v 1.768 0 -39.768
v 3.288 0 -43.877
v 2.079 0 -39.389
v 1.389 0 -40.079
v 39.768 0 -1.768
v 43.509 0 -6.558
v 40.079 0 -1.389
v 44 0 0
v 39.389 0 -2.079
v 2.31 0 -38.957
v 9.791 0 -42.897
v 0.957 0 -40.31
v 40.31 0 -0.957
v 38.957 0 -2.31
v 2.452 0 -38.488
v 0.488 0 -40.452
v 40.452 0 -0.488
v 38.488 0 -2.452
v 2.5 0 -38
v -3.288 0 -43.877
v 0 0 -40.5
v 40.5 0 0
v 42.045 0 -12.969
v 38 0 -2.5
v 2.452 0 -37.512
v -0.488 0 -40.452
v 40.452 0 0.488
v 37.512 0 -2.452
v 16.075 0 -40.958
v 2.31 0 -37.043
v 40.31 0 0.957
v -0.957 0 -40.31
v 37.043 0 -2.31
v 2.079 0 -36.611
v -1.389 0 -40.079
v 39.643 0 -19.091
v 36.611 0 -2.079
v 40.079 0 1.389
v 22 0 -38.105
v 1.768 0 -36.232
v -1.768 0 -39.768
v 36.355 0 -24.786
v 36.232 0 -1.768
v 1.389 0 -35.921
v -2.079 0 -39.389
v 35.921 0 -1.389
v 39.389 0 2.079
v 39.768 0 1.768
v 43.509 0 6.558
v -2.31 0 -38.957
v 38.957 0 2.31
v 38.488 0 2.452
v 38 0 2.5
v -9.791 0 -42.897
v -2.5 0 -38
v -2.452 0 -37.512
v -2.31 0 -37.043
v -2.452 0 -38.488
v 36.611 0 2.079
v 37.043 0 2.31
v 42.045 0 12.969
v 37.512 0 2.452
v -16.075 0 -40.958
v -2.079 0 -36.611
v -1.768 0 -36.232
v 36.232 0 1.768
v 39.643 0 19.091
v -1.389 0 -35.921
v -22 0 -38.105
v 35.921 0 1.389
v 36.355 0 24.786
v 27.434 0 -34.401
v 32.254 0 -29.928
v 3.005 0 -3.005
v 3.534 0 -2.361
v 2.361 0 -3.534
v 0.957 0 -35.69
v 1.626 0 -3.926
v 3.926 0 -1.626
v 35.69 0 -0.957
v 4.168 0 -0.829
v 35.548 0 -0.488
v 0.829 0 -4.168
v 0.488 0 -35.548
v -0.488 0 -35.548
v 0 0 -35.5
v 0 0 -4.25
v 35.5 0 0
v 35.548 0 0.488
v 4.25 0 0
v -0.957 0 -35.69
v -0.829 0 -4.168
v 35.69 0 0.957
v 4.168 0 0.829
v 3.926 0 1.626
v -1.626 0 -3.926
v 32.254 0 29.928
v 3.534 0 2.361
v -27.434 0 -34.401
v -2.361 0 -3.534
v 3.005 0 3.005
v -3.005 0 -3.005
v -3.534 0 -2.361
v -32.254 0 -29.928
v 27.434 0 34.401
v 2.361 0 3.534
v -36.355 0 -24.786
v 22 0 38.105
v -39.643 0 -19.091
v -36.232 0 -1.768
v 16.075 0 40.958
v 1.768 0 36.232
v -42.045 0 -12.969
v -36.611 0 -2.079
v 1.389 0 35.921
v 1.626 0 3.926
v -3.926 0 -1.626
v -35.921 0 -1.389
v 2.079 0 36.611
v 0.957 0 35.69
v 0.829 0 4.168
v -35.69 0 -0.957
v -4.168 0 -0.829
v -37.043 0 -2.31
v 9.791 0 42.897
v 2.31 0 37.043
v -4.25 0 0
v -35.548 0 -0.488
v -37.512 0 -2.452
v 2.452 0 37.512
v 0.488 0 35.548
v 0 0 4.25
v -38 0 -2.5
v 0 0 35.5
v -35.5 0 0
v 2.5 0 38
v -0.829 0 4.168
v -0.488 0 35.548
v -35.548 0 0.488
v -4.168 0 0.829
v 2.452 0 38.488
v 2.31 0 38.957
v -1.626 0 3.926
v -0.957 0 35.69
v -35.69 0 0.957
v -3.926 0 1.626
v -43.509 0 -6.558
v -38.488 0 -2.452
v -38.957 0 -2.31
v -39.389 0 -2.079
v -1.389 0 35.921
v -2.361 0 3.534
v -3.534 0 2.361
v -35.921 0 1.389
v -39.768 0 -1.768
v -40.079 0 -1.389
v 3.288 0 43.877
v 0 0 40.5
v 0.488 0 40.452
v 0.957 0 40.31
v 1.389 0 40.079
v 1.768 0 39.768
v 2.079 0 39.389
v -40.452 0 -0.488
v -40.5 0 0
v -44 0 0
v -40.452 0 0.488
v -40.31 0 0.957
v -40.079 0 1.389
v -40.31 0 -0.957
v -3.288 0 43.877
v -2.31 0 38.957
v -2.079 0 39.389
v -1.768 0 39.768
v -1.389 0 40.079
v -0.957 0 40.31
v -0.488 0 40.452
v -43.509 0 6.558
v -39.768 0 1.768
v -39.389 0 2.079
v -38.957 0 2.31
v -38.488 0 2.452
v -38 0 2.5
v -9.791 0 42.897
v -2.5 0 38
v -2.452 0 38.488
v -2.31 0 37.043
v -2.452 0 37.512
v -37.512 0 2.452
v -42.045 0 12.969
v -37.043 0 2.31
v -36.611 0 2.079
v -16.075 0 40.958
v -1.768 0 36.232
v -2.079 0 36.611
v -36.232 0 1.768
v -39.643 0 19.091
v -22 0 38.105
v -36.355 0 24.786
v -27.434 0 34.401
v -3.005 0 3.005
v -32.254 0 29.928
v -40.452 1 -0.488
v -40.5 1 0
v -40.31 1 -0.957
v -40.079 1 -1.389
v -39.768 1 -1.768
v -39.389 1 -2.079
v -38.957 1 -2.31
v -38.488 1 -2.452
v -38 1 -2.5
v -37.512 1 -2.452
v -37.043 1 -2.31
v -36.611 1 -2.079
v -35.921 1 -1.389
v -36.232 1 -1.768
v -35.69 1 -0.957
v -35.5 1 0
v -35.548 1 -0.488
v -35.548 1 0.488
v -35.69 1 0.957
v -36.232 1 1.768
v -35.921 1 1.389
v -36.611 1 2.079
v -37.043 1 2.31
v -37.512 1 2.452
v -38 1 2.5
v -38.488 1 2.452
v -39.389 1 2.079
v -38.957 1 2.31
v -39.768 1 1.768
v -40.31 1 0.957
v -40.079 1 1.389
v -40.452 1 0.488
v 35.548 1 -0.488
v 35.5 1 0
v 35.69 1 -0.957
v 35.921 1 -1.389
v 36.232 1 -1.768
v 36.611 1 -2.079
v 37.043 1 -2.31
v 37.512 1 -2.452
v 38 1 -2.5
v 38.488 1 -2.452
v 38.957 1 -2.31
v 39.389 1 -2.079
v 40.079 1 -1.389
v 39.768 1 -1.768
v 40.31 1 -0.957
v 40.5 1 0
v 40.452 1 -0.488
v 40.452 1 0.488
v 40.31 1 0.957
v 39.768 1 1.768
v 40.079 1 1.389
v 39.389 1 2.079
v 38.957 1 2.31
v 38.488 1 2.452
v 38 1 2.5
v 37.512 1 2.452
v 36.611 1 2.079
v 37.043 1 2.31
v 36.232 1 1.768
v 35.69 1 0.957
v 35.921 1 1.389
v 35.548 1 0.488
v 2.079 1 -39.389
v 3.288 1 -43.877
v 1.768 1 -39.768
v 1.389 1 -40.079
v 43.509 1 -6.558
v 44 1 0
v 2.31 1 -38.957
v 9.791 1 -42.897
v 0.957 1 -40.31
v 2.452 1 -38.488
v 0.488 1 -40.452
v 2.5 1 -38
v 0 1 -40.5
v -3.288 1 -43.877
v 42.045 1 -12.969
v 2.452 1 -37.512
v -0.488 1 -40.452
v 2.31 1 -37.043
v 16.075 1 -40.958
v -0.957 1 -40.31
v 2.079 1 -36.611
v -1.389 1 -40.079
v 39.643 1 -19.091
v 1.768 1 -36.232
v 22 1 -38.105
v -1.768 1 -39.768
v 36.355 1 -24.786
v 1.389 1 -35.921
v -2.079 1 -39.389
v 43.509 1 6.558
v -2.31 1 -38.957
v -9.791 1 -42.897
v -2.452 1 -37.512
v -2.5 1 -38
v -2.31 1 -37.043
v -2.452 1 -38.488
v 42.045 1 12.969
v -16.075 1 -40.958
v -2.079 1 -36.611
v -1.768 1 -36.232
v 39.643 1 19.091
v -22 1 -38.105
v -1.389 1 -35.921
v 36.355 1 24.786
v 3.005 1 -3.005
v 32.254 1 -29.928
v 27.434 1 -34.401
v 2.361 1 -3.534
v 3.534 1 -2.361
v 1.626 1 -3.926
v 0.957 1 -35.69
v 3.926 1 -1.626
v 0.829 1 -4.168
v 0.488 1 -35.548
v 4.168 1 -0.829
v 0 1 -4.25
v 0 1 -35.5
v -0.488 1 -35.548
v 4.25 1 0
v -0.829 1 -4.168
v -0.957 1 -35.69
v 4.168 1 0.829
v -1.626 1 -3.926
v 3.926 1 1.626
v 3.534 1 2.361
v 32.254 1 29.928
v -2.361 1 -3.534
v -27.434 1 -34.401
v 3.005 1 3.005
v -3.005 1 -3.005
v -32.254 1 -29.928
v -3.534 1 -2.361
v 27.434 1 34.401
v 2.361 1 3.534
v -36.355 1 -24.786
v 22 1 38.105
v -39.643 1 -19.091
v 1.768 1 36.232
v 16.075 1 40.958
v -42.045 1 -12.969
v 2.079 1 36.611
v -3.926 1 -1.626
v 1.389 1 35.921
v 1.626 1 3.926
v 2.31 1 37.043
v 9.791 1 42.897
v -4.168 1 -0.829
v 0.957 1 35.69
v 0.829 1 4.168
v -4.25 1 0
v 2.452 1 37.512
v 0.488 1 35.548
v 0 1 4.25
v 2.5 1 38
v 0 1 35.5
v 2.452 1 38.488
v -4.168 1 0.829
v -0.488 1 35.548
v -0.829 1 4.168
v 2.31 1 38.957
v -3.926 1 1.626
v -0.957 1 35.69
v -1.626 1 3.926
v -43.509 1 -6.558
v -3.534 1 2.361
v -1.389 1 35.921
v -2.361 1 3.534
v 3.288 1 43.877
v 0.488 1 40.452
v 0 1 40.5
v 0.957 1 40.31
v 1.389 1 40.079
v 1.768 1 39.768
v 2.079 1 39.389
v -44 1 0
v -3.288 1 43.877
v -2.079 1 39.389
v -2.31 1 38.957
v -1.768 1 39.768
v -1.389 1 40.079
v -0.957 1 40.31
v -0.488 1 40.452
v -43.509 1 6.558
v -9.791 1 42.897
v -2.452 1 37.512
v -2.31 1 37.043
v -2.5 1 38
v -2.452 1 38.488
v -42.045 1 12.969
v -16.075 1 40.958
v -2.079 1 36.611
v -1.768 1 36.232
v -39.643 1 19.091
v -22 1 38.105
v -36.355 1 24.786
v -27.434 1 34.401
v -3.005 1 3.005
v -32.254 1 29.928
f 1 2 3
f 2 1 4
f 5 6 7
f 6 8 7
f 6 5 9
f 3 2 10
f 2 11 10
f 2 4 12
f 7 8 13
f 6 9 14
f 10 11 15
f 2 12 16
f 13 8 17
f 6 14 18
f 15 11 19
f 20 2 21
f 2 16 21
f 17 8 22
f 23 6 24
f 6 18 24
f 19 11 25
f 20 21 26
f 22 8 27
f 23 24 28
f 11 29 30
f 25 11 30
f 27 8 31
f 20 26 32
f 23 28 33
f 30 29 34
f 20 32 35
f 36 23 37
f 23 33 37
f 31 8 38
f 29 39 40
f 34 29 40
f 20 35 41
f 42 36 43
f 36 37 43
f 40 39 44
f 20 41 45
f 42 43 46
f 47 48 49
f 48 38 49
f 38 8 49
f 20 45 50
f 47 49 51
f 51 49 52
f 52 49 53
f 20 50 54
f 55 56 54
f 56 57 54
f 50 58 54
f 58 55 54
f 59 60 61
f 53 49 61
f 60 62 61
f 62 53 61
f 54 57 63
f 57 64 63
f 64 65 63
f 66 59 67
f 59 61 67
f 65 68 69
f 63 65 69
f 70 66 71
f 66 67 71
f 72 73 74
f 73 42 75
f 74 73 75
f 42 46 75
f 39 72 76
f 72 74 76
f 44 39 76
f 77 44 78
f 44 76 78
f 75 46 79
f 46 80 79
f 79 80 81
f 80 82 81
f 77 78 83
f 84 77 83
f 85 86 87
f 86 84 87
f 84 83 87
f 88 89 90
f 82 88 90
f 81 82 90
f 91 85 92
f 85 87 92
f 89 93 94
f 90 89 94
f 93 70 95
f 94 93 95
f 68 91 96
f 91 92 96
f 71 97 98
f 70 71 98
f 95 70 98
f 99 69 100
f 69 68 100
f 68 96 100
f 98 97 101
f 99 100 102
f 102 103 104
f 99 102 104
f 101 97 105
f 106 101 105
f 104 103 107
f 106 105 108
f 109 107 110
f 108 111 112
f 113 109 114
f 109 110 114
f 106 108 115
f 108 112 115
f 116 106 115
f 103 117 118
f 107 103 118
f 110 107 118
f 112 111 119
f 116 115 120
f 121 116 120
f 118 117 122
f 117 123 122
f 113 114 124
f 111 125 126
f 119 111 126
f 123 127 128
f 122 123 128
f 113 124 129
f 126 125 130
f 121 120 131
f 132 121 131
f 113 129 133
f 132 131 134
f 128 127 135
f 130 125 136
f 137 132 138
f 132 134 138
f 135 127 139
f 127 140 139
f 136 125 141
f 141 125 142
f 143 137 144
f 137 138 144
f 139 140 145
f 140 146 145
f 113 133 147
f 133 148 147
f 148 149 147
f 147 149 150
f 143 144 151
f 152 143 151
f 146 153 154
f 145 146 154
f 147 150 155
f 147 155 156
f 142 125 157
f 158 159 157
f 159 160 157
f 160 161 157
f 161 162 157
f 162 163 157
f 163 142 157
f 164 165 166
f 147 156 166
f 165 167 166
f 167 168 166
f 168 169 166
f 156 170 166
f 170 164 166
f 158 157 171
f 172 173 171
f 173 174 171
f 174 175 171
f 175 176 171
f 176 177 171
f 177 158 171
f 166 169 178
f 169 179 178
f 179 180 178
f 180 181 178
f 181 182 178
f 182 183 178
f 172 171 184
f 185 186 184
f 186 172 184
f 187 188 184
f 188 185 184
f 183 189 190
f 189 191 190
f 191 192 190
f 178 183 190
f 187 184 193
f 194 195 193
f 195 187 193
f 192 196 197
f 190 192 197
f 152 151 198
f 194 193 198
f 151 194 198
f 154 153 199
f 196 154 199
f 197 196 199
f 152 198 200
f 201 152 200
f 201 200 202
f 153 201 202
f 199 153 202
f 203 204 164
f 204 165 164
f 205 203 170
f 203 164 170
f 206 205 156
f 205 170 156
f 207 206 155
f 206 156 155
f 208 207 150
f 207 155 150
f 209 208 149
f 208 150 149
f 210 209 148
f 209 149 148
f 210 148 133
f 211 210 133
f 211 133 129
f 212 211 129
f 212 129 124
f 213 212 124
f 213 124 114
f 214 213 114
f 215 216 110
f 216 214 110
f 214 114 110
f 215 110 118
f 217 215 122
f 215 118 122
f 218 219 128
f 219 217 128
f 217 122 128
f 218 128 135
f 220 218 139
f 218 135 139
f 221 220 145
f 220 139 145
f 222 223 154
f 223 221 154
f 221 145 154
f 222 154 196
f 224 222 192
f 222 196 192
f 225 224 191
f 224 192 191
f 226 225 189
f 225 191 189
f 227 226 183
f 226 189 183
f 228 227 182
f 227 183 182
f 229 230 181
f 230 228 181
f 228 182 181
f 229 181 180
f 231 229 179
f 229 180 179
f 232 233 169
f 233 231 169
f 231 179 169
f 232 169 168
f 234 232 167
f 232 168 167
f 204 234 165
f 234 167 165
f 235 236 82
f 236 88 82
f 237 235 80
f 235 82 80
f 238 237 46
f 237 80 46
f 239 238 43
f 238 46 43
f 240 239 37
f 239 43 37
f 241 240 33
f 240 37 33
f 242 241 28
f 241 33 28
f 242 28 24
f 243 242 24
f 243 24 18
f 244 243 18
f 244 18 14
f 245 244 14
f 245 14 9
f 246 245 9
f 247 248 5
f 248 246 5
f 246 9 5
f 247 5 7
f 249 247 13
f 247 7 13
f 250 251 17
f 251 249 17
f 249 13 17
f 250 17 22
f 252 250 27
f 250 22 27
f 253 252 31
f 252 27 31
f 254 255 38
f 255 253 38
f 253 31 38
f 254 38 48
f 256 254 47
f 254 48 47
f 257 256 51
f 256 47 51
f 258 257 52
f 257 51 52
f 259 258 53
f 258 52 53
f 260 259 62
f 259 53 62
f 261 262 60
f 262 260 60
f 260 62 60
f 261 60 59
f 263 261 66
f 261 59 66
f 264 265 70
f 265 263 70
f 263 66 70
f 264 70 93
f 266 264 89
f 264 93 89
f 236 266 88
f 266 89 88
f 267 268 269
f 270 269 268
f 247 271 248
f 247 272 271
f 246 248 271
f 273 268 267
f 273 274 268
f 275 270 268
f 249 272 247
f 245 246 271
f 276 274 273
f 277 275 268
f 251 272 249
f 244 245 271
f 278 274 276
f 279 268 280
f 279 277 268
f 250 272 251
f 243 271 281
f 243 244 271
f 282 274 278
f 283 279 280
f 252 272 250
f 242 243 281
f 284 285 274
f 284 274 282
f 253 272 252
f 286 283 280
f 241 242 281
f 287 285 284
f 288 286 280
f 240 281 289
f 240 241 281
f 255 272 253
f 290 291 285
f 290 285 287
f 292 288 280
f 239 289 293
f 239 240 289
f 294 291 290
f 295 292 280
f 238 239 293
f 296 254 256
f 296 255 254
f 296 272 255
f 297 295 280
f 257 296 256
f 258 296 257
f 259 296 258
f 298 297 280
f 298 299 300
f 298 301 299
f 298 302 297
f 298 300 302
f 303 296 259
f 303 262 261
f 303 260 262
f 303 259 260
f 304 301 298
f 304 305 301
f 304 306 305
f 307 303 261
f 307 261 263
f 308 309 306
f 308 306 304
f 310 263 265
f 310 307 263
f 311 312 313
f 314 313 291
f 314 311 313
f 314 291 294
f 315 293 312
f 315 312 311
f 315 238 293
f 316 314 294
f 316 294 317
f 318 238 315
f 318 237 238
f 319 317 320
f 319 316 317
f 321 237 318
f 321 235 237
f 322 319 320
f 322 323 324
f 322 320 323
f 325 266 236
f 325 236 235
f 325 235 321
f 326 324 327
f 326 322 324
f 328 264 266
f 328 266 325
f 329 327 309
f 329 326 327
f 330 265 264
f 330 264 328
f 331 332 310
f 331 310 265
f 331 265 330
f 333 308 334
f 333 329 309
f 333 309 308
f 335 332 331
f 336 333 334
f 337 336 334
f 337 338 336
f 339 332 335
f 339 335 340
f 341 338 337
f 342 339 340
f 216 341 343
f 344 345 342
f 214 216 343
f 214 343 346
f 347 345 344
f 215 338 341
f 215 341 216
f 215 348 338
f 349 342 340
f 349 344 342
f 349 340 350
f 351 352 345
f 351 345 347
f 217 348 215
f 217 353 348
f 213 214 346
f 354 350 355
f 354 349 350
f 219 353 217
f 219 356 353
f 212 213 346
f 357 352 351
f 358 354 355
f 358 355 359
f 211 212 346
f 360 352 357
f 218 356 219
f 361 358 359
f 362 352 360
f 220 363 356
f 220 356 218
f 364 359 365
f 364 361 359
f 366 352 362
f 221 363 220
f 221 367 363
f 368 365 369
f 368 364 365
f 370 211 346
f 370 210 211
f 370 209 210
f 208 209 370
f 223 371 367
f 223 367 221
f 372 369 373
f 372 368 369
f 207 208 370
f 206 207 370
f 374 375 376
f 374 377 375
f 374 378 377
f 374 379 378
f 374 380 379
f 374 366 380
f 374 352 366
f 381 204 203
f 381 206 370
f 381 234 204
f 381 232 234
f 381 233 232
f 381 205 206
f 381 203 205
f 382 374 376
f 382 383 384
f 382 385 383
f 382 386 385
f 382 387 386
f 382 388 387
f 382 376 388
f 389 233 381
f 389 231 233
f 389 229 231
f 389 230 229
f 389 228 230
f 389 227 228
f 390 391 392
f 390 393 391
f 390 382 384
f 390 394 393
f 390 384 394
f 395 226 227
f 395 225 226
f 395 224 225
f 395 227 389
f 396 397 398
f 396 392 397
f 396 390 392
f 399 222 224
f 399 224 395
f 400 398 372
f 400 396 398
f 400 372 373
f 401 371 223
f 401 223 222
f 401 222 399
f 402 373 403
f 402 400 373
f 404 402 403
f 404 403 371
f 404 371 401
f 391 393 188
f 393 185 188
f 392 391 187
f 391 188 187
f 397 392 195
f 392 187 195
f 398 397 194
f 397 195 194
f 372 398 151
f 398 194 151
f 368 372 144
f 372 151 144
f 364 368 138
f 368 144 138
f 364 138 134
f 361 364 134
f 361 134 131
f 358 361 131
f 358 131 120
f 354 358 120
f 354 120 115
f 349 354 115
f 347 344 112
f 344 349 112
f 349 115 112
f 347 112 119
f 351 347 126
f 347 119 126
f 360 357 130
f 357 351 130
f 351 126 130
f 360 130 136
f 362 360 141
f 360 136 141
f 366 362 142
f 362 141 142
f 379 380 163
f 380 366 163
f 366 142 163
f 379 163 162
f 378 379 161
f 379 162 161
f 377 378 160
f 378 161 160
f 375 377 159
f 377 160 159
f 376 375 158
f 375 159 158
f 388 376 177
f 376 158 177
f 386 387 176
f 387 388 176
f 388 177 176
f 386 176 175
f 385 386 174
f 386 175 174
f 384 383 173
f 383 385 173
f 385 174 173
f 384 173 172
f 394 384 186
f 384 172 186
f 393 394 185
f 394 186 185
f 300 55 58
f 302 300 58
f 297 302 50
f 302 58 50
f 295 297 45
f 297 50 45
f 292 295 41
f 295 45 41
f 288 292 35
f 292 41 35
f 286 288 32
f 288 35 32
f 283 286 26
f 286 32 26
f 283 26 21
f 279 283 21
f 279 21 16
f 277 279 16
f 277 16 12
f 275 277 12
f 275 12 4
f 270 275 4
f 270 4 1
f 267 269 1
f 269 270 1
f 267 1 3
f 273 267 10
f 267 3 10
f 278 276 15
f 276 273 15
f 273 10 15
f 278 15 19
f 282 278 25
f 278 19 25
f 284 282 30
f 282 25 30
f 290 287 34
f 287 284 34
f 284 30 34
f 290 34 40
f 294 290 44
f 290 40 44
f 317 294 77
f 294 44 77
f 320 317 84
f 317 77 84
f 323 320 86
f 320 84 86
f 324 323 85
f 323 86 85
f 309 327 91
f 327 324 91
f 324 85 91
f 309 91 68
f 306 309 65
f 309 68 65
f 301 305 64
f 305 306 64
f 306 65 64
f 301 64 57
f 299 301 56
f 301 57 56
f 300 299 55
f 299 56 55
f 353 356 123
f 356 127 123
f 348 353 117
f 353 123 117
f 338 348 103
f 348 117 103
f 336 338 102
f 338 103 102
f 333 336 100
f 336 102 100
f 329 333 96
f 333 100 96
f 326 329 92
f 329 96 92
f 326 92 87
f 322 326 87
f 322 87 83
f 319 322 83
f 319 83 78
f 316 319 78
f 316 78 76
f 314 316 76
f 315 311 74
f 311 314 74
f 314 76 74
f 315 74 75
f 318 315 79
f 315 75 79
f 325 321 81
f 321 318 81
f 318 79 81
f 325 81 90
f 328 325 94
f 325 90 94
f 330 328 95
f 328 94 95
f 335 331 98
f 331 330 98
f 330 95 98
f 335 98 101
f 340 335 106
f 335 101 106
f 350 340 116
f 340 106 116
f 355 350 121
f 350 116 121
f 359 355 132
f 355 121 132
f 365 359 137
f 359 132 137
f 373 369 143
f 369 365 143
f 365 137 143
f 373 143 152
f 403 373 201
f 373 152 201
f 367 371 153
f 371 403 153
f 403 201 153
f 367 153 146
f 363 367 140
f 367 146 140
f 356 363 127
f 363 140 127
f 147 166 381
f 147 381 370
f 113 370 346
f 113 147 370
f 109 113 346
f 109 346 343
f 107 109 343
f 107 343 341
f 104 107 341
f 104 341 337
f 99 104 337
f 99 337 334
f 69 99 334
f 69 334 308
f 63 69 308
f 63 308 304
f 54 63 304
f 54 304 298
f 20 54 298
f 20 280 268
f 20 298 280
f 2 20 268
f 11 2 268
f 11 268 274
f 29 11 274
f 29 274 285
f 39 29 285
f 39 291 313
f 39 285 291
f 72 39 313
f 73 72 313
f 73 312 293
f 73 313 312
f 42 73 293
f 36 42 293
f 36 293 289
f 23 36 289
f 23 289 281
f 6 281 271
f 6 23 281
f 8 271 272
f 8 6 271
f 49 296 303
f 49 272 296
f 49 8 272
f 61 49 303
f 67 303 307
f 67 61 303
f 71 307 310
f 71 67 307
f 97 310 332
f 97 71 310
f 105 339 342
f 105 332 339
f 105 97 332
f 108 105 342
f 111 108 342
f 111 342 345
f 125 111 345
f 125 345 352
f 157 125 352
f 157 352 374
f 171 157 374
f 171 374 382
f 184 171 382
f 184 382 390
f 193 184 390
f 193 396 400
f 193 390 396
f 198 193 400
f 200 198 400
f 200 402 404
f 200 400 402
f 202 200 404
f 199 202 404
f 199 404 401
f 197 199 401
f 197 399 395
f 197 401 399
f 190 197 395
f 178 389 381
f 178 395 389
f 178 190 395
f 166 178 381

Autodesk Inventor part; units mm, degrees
ref_plane "YZ Plane" through (0, 0, 0) normal (1, 0, 0) x (0, 1, 0)
ref_plane "XZ Plane" through (0, 0, 0) normal (0, 1, 0) x (-1, 0, 0)
ref_plane "XY Plane" through (0, 0, 0) normal (0, 0, 1) x (1, 0, 0)
sketch "Эскиз1" plane through (0, 0, 0) normal (0, 1, 0) x (-1, 0, 0)
  circle A0 centre (0, 0) radius 44
  circle A1 centre (0, 0) radius 4.25
  circle A2 centre (0, -38) radius 2.5
  circle A3 centre (38, 0) radius 2.5
  circle A4 centre (0, 38) radius 2.5
  circle A5 centre (-38, 0) radius 2.5
  dimension "d0" = 88
  dimension "d1" = 8.5
  dimension "d3" = 5
  dimension "d6" = 360
extrude "Выдавливание1" add sketch "Эскиз1" along normal blind 1
